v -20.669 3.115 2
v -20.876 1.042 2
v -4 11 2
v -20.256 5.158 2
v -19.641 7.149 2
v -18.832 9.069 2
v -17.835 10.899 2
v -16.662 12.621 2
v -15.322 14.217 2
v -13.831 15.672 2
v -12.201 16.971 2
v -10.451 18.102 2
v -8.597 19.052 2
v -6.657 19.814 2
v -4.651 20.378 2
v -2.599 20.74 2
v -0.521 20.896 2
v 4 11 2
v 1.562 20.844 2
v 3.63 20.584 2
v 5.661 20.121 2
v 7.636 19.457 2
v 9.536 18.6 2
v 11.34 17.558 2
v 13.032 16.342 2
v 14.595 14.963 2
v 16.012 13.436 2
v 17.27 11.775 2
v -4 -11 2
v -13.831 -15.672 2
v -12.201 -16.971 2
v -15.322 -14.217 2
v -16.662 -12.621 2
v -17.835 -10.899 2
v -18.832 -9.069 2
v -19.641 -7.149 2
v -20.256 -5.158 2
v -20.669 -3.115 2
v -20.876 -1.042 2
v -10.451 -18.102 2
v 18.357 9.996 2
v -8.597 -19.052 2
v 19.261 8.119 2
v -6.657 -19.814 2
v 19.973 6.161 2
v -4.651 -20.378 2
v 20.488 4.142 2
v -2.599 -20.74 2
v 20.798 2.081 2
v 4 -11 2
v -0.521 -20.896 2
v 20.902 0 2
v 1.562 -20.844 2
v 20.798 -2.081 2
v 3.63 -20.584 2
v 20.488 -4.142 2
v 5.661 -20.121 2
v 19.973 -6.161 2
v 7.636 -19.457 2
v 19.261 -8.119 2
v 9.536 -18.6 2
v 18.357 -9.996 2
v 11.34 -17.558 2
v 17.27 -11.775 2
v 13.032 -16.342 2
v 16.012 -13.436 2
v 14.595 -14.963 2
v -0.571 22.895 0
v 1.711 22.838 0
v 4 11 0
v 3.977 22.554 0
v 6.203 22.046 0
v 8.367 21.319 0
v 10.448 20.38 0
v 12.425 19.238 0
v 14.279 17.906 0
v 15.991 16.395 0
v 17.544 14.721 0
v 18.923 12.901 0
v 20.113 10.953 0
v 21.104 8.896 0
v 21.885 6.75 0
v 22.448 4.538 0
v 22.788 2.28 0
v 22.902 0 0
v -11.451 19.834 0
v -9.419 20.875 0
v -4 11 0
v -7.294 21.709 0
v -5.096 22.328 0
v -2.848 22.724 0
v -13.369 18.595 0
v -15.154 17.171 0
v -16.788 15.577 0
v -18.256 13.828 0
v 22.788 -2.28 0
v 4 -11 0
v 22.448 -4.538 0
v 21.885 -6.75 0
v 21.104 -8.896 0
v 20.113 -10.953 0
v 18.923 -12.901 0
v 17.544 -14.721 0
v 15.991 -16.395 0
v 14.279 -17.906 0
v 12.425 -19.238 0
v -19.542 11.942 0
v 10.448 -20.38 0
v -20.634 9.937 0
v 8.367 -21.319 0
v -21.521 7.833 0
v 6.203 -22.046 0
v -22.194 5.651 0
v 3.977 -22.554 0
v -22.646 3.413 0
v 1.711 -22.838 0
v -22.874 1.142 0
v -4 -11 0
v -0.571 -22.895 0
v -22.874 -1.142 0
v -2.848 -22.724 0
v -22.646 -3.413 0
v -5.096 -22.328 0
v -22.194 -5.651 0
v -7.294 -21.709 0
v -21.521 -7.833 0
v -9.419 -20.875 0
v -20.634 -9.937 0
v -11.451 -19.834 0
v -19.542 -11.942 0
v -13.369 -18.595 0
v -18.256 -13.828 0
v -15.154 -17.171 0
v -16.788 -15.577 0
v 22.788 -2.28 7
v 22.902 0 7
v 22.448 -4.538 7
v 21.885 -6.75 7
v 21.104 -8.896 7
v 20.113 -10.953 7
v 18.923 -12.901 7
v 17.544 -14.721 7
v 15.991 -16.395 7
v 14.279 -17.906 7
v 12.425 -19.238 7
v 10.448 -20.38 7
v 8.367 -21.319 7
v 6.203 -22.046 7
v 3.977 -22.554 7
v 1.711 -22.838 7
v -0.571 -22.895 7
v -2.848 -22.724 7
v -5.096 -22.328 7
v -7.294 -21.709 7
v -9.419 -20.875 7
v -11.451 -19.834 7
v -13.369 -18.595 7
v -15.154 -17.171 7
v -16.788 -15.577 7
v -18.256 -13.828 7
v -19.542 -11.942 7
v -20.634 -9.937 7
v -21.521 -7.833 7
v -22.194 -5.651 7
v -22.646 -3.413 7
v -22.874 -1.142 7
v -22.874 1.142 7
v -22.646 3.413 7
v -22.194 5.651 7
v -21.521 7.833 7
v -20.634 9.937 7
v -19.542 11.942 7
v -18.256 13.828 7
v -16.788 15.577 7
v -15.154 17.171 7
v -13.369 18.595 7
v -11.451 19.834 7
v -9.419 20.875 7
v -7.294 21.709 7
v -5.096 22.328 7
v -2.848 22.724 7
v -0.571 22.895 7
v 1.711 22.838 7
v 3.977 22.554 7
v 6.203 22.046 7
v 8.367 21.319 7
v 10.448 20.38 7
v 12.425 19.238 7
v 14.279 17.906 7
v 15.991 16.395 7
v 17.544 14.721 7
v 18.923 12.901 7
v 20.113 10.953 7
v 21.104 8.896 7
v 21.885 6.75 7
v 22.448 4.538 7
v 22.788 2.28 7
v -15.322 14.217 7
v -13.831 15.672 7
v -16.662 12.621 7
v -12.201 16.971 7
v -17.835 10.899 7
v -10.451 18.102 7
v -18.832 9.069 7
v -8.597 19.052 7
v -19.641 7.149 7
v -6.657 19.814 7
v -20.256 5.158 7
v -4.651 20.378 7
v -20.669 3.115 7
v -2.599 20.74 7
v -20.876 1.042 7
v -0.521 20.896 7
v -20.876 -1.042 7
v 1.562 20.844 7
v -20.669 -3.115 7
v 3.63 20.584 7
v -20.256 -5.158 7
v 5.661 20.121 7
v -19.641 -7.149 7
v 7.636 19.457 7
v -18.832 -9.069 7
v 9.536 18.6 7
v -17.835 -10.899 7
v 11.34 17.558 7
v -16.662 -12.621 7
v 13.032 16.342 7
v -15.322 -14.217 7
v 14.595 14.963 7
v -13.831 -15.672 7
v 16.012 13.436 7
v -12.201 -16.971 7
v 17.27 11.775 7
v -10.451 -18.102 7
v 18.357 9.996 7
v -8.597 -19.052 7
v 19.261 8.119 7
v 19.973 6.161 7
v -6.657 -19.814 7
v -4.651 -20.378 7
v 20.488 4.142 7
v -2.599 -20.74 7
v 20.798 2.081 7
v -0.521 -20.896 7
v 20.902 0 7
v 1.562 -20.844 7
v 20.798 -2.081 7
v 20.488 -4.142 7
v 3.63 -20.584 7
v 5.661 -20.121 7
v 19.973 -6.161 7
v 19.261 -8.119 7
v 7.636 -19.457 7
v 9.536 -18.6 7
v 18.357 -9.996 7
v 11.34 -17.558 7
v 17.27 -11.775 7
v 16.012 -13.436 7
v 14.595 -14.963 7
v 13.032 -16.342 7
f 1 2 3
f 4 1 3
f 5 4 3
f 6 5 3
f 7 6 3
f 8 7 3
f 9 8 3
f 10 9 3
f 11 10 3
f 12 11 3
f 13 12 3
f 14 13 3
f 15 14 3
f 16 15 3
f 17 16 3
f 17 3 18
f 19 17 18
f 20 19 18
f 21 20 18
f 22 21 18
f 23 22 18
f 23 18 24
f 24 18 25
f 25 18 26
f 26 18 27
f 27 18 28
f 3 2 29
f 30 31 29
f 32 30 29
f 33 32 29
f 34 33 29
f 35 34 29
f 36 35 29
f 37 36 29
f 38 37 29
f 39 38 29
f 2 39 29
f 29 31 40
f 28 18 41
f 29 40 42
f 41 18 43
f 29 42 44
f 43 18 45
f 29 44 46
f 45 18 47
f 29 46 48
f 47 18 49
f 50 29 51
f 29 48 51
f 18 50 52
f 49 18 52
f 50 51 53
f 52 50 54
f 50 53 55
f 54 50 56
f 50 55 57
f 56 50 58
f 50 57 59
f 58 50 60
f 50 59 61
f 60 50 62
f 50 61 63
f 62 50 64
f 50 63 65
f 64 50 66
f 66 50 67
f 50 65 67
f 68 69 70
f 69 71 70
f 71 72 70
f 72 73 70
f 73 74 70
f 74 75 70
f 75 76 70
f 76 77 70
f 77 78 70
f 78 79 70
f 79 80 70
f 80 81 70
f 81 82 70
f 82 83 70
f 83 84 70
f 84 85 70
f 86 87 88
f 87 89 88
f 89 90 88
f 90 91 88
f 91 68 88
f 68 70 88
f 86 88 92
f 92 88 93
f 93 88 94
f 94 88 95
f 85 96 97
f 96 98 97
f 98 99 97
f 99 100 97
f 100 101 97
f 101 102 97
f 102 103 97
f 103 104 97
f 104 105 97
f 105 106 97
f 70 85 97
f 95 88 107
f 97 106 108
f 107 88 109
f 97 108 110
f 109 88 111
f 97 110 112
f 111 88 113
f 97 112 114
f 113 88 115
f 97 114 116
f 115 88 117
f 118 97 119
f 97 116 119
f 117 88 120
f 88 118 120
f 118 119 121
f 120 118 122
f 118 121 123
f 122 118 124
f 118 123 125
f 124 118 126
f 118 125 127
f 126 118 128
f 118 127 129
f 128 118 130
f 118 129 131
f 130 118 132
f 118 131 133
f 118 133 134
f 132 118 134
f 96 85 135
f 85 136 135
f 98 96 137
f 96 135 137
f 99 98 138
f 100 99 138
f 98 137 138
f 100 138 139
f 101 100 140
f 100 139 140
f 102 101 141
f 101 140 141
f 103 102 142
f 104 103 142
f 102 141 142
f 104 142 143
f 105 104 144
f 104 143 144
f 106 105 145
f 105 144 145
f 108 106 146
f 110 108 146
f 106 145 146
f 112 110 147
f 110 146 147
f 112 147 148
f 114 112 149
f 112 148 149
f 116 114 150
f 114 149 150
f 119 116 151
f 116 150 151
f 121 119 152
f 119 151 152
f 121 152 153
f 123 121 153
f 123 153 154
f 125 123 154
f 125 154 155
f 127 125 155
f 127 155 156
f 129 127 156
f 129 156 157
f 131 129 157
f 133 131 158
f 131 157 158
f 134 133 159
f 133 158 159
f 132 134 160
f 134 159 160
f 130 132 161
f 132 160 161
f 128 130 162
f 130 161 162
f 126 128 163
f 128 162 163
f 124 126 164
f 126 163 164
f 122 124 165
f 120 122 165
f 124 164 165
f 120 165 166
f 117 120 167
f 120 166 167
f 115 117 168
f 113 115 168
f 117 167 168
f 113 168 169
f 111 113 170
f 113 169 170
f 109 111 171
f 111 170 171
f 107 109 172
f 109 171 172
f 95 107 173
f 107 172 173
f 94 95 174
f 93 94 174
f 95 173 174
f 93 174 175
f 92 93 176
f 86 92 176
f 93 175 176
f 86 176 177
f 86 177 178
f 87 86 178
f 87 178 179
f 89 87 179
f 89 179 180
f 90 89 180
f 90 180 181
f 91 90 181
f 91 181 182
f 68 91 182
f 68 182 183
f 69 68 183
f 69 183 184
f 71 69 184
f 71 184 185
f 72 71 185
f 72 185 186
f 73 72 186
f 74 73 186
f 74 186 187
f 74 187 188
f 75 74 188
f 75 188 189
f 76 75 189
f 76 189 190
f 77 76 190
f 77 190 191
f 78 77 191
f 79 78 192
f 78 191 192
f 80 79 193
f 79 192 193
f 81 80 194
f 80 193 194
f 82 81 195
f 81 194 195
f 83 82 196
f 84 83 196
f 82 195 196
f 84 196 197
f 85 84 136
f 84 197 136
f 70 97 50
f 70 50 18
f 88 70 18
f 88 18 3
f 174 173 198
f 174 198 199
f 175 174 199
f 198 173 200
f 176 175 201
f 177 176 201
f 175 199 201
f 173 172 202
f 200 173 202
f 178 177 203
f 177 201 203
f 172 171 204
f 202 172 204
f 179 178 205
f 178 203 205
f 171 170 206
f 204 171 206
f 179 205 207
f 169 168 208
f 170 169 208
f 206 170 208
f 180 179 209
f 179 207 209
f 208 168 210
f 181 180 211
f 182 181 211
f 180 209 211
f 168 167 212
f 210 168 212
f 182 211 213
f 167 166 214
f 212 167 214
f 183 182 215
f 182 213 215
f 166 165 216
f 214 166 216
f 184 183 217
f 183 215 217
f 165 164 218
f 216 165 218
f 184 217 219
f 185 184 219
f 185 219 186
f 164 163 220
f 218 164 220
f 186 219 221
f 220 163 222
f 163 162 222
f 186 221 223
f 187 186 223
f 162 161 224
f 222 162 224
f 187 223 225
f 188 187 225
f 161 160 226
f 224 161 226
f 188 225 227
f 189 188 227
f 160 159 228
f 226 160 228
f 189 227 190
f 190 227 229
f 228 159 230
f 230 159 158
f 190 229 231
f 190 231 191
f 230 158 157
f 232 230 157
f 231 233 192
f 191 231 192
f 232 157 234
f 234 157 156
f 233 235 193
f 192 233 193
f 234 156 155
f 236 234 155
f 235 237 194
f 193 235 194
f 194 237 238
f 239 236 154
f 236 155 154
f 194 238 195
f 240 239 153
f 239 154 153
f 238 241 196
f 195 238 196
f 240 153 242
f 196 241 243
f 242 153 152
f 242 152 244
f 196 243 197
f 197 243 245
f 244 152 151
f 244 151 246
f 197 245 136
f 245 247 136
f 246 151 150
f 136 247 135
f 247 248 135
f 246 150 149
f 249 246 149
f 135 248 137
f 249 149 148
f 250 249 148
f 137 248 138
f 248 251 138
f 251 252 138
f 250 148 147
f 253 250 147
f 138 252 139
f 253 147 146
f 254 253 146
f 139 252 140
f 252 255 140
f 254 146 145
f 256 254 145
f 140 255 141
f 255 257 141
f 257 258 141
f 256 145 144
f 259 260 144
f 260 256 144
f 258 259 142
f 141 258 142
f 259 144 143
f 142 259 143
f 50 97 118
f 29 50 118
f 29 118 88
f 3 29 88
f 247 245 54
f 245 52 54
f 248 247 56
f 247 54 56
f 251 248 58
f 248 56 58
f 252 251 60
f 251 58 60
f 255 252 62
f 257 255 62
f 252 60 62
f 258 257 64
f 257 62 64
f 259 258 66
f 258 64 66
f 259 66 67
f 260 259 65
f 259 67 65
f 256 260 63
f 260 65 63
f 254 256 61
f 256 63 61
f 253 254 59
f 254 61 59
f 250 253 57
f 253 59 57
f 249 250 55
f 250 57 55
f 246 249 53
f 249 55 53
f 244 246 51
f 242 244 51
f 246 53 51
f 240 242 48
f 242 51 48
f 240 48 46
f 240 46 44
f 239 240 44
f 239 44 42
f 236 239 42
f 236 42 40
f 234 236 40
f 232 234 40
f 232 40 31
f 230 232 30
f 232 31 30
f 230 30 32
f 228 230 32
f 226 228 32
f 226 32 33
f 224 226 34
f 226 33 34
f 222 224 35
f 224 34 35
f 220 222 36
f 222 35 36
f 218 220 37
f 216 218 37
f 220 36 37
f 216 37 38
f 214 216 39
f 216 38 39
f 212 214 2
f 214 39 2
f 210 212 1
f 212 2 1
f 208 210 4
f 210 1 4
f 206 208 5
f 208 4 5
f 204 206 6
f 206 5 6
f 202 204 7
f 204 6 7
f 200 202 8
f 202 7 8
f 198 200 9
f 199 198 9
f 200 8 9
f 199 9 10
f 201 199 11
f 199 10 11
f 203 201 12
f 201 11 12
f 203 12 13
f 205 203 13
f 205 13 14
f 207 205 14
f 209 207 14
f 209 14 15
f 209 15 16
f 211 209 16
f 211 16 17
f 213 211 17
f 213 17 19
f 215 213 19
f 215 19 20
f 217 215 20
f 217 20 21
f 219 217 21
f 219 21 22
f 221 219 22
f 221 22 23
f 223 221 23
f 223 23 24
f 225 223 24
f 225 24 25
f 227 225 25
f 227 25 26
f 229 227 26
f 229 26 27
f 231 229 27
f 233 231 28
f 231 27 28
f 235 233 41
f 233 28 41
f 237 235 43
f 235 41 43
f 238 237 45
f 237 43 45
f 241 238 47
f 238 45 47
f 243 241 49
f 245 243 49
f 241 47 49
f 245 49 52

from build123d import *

# Parameters (mm, degrees)
SKIZZE2_W                       = 8
SKIZZE2_H                       = 22
SCHNITT_LINEAR_AUSTRAGEN1_DEPTH = 10


with BuildPart() as part:
    # Skizze1 → Rotation2 (revolve)
    with BuildSketch(Plane(origin=(0, 0, 0), x_dir=(1, 0, 0), z_dir=(0, 1, 0))):
        Polygon((0, 0), (22.902, 0), (22.902, -7), (20.902, -7), (20.902, -2), (0, -2), align=None)
    revolve(axis=Axis((0, 0, 2), (0, 0, -1)))

    # Skizze2 → Schnitt-Linear austragen1 (cut)
    with BuildSketch(Plane(origin=(0, 0, 0), x_dir=(-1, 0, 0), z_dir=(0, 0, -1))):
        Rectangle(SKIZZE2_W, SKIZZE2_H)
    extrude(amount=-SCHNITT_LINEAR_AUSTRAGEN1_DEPTH, mode=Mode.SUBTRACT)


solid = part.part
